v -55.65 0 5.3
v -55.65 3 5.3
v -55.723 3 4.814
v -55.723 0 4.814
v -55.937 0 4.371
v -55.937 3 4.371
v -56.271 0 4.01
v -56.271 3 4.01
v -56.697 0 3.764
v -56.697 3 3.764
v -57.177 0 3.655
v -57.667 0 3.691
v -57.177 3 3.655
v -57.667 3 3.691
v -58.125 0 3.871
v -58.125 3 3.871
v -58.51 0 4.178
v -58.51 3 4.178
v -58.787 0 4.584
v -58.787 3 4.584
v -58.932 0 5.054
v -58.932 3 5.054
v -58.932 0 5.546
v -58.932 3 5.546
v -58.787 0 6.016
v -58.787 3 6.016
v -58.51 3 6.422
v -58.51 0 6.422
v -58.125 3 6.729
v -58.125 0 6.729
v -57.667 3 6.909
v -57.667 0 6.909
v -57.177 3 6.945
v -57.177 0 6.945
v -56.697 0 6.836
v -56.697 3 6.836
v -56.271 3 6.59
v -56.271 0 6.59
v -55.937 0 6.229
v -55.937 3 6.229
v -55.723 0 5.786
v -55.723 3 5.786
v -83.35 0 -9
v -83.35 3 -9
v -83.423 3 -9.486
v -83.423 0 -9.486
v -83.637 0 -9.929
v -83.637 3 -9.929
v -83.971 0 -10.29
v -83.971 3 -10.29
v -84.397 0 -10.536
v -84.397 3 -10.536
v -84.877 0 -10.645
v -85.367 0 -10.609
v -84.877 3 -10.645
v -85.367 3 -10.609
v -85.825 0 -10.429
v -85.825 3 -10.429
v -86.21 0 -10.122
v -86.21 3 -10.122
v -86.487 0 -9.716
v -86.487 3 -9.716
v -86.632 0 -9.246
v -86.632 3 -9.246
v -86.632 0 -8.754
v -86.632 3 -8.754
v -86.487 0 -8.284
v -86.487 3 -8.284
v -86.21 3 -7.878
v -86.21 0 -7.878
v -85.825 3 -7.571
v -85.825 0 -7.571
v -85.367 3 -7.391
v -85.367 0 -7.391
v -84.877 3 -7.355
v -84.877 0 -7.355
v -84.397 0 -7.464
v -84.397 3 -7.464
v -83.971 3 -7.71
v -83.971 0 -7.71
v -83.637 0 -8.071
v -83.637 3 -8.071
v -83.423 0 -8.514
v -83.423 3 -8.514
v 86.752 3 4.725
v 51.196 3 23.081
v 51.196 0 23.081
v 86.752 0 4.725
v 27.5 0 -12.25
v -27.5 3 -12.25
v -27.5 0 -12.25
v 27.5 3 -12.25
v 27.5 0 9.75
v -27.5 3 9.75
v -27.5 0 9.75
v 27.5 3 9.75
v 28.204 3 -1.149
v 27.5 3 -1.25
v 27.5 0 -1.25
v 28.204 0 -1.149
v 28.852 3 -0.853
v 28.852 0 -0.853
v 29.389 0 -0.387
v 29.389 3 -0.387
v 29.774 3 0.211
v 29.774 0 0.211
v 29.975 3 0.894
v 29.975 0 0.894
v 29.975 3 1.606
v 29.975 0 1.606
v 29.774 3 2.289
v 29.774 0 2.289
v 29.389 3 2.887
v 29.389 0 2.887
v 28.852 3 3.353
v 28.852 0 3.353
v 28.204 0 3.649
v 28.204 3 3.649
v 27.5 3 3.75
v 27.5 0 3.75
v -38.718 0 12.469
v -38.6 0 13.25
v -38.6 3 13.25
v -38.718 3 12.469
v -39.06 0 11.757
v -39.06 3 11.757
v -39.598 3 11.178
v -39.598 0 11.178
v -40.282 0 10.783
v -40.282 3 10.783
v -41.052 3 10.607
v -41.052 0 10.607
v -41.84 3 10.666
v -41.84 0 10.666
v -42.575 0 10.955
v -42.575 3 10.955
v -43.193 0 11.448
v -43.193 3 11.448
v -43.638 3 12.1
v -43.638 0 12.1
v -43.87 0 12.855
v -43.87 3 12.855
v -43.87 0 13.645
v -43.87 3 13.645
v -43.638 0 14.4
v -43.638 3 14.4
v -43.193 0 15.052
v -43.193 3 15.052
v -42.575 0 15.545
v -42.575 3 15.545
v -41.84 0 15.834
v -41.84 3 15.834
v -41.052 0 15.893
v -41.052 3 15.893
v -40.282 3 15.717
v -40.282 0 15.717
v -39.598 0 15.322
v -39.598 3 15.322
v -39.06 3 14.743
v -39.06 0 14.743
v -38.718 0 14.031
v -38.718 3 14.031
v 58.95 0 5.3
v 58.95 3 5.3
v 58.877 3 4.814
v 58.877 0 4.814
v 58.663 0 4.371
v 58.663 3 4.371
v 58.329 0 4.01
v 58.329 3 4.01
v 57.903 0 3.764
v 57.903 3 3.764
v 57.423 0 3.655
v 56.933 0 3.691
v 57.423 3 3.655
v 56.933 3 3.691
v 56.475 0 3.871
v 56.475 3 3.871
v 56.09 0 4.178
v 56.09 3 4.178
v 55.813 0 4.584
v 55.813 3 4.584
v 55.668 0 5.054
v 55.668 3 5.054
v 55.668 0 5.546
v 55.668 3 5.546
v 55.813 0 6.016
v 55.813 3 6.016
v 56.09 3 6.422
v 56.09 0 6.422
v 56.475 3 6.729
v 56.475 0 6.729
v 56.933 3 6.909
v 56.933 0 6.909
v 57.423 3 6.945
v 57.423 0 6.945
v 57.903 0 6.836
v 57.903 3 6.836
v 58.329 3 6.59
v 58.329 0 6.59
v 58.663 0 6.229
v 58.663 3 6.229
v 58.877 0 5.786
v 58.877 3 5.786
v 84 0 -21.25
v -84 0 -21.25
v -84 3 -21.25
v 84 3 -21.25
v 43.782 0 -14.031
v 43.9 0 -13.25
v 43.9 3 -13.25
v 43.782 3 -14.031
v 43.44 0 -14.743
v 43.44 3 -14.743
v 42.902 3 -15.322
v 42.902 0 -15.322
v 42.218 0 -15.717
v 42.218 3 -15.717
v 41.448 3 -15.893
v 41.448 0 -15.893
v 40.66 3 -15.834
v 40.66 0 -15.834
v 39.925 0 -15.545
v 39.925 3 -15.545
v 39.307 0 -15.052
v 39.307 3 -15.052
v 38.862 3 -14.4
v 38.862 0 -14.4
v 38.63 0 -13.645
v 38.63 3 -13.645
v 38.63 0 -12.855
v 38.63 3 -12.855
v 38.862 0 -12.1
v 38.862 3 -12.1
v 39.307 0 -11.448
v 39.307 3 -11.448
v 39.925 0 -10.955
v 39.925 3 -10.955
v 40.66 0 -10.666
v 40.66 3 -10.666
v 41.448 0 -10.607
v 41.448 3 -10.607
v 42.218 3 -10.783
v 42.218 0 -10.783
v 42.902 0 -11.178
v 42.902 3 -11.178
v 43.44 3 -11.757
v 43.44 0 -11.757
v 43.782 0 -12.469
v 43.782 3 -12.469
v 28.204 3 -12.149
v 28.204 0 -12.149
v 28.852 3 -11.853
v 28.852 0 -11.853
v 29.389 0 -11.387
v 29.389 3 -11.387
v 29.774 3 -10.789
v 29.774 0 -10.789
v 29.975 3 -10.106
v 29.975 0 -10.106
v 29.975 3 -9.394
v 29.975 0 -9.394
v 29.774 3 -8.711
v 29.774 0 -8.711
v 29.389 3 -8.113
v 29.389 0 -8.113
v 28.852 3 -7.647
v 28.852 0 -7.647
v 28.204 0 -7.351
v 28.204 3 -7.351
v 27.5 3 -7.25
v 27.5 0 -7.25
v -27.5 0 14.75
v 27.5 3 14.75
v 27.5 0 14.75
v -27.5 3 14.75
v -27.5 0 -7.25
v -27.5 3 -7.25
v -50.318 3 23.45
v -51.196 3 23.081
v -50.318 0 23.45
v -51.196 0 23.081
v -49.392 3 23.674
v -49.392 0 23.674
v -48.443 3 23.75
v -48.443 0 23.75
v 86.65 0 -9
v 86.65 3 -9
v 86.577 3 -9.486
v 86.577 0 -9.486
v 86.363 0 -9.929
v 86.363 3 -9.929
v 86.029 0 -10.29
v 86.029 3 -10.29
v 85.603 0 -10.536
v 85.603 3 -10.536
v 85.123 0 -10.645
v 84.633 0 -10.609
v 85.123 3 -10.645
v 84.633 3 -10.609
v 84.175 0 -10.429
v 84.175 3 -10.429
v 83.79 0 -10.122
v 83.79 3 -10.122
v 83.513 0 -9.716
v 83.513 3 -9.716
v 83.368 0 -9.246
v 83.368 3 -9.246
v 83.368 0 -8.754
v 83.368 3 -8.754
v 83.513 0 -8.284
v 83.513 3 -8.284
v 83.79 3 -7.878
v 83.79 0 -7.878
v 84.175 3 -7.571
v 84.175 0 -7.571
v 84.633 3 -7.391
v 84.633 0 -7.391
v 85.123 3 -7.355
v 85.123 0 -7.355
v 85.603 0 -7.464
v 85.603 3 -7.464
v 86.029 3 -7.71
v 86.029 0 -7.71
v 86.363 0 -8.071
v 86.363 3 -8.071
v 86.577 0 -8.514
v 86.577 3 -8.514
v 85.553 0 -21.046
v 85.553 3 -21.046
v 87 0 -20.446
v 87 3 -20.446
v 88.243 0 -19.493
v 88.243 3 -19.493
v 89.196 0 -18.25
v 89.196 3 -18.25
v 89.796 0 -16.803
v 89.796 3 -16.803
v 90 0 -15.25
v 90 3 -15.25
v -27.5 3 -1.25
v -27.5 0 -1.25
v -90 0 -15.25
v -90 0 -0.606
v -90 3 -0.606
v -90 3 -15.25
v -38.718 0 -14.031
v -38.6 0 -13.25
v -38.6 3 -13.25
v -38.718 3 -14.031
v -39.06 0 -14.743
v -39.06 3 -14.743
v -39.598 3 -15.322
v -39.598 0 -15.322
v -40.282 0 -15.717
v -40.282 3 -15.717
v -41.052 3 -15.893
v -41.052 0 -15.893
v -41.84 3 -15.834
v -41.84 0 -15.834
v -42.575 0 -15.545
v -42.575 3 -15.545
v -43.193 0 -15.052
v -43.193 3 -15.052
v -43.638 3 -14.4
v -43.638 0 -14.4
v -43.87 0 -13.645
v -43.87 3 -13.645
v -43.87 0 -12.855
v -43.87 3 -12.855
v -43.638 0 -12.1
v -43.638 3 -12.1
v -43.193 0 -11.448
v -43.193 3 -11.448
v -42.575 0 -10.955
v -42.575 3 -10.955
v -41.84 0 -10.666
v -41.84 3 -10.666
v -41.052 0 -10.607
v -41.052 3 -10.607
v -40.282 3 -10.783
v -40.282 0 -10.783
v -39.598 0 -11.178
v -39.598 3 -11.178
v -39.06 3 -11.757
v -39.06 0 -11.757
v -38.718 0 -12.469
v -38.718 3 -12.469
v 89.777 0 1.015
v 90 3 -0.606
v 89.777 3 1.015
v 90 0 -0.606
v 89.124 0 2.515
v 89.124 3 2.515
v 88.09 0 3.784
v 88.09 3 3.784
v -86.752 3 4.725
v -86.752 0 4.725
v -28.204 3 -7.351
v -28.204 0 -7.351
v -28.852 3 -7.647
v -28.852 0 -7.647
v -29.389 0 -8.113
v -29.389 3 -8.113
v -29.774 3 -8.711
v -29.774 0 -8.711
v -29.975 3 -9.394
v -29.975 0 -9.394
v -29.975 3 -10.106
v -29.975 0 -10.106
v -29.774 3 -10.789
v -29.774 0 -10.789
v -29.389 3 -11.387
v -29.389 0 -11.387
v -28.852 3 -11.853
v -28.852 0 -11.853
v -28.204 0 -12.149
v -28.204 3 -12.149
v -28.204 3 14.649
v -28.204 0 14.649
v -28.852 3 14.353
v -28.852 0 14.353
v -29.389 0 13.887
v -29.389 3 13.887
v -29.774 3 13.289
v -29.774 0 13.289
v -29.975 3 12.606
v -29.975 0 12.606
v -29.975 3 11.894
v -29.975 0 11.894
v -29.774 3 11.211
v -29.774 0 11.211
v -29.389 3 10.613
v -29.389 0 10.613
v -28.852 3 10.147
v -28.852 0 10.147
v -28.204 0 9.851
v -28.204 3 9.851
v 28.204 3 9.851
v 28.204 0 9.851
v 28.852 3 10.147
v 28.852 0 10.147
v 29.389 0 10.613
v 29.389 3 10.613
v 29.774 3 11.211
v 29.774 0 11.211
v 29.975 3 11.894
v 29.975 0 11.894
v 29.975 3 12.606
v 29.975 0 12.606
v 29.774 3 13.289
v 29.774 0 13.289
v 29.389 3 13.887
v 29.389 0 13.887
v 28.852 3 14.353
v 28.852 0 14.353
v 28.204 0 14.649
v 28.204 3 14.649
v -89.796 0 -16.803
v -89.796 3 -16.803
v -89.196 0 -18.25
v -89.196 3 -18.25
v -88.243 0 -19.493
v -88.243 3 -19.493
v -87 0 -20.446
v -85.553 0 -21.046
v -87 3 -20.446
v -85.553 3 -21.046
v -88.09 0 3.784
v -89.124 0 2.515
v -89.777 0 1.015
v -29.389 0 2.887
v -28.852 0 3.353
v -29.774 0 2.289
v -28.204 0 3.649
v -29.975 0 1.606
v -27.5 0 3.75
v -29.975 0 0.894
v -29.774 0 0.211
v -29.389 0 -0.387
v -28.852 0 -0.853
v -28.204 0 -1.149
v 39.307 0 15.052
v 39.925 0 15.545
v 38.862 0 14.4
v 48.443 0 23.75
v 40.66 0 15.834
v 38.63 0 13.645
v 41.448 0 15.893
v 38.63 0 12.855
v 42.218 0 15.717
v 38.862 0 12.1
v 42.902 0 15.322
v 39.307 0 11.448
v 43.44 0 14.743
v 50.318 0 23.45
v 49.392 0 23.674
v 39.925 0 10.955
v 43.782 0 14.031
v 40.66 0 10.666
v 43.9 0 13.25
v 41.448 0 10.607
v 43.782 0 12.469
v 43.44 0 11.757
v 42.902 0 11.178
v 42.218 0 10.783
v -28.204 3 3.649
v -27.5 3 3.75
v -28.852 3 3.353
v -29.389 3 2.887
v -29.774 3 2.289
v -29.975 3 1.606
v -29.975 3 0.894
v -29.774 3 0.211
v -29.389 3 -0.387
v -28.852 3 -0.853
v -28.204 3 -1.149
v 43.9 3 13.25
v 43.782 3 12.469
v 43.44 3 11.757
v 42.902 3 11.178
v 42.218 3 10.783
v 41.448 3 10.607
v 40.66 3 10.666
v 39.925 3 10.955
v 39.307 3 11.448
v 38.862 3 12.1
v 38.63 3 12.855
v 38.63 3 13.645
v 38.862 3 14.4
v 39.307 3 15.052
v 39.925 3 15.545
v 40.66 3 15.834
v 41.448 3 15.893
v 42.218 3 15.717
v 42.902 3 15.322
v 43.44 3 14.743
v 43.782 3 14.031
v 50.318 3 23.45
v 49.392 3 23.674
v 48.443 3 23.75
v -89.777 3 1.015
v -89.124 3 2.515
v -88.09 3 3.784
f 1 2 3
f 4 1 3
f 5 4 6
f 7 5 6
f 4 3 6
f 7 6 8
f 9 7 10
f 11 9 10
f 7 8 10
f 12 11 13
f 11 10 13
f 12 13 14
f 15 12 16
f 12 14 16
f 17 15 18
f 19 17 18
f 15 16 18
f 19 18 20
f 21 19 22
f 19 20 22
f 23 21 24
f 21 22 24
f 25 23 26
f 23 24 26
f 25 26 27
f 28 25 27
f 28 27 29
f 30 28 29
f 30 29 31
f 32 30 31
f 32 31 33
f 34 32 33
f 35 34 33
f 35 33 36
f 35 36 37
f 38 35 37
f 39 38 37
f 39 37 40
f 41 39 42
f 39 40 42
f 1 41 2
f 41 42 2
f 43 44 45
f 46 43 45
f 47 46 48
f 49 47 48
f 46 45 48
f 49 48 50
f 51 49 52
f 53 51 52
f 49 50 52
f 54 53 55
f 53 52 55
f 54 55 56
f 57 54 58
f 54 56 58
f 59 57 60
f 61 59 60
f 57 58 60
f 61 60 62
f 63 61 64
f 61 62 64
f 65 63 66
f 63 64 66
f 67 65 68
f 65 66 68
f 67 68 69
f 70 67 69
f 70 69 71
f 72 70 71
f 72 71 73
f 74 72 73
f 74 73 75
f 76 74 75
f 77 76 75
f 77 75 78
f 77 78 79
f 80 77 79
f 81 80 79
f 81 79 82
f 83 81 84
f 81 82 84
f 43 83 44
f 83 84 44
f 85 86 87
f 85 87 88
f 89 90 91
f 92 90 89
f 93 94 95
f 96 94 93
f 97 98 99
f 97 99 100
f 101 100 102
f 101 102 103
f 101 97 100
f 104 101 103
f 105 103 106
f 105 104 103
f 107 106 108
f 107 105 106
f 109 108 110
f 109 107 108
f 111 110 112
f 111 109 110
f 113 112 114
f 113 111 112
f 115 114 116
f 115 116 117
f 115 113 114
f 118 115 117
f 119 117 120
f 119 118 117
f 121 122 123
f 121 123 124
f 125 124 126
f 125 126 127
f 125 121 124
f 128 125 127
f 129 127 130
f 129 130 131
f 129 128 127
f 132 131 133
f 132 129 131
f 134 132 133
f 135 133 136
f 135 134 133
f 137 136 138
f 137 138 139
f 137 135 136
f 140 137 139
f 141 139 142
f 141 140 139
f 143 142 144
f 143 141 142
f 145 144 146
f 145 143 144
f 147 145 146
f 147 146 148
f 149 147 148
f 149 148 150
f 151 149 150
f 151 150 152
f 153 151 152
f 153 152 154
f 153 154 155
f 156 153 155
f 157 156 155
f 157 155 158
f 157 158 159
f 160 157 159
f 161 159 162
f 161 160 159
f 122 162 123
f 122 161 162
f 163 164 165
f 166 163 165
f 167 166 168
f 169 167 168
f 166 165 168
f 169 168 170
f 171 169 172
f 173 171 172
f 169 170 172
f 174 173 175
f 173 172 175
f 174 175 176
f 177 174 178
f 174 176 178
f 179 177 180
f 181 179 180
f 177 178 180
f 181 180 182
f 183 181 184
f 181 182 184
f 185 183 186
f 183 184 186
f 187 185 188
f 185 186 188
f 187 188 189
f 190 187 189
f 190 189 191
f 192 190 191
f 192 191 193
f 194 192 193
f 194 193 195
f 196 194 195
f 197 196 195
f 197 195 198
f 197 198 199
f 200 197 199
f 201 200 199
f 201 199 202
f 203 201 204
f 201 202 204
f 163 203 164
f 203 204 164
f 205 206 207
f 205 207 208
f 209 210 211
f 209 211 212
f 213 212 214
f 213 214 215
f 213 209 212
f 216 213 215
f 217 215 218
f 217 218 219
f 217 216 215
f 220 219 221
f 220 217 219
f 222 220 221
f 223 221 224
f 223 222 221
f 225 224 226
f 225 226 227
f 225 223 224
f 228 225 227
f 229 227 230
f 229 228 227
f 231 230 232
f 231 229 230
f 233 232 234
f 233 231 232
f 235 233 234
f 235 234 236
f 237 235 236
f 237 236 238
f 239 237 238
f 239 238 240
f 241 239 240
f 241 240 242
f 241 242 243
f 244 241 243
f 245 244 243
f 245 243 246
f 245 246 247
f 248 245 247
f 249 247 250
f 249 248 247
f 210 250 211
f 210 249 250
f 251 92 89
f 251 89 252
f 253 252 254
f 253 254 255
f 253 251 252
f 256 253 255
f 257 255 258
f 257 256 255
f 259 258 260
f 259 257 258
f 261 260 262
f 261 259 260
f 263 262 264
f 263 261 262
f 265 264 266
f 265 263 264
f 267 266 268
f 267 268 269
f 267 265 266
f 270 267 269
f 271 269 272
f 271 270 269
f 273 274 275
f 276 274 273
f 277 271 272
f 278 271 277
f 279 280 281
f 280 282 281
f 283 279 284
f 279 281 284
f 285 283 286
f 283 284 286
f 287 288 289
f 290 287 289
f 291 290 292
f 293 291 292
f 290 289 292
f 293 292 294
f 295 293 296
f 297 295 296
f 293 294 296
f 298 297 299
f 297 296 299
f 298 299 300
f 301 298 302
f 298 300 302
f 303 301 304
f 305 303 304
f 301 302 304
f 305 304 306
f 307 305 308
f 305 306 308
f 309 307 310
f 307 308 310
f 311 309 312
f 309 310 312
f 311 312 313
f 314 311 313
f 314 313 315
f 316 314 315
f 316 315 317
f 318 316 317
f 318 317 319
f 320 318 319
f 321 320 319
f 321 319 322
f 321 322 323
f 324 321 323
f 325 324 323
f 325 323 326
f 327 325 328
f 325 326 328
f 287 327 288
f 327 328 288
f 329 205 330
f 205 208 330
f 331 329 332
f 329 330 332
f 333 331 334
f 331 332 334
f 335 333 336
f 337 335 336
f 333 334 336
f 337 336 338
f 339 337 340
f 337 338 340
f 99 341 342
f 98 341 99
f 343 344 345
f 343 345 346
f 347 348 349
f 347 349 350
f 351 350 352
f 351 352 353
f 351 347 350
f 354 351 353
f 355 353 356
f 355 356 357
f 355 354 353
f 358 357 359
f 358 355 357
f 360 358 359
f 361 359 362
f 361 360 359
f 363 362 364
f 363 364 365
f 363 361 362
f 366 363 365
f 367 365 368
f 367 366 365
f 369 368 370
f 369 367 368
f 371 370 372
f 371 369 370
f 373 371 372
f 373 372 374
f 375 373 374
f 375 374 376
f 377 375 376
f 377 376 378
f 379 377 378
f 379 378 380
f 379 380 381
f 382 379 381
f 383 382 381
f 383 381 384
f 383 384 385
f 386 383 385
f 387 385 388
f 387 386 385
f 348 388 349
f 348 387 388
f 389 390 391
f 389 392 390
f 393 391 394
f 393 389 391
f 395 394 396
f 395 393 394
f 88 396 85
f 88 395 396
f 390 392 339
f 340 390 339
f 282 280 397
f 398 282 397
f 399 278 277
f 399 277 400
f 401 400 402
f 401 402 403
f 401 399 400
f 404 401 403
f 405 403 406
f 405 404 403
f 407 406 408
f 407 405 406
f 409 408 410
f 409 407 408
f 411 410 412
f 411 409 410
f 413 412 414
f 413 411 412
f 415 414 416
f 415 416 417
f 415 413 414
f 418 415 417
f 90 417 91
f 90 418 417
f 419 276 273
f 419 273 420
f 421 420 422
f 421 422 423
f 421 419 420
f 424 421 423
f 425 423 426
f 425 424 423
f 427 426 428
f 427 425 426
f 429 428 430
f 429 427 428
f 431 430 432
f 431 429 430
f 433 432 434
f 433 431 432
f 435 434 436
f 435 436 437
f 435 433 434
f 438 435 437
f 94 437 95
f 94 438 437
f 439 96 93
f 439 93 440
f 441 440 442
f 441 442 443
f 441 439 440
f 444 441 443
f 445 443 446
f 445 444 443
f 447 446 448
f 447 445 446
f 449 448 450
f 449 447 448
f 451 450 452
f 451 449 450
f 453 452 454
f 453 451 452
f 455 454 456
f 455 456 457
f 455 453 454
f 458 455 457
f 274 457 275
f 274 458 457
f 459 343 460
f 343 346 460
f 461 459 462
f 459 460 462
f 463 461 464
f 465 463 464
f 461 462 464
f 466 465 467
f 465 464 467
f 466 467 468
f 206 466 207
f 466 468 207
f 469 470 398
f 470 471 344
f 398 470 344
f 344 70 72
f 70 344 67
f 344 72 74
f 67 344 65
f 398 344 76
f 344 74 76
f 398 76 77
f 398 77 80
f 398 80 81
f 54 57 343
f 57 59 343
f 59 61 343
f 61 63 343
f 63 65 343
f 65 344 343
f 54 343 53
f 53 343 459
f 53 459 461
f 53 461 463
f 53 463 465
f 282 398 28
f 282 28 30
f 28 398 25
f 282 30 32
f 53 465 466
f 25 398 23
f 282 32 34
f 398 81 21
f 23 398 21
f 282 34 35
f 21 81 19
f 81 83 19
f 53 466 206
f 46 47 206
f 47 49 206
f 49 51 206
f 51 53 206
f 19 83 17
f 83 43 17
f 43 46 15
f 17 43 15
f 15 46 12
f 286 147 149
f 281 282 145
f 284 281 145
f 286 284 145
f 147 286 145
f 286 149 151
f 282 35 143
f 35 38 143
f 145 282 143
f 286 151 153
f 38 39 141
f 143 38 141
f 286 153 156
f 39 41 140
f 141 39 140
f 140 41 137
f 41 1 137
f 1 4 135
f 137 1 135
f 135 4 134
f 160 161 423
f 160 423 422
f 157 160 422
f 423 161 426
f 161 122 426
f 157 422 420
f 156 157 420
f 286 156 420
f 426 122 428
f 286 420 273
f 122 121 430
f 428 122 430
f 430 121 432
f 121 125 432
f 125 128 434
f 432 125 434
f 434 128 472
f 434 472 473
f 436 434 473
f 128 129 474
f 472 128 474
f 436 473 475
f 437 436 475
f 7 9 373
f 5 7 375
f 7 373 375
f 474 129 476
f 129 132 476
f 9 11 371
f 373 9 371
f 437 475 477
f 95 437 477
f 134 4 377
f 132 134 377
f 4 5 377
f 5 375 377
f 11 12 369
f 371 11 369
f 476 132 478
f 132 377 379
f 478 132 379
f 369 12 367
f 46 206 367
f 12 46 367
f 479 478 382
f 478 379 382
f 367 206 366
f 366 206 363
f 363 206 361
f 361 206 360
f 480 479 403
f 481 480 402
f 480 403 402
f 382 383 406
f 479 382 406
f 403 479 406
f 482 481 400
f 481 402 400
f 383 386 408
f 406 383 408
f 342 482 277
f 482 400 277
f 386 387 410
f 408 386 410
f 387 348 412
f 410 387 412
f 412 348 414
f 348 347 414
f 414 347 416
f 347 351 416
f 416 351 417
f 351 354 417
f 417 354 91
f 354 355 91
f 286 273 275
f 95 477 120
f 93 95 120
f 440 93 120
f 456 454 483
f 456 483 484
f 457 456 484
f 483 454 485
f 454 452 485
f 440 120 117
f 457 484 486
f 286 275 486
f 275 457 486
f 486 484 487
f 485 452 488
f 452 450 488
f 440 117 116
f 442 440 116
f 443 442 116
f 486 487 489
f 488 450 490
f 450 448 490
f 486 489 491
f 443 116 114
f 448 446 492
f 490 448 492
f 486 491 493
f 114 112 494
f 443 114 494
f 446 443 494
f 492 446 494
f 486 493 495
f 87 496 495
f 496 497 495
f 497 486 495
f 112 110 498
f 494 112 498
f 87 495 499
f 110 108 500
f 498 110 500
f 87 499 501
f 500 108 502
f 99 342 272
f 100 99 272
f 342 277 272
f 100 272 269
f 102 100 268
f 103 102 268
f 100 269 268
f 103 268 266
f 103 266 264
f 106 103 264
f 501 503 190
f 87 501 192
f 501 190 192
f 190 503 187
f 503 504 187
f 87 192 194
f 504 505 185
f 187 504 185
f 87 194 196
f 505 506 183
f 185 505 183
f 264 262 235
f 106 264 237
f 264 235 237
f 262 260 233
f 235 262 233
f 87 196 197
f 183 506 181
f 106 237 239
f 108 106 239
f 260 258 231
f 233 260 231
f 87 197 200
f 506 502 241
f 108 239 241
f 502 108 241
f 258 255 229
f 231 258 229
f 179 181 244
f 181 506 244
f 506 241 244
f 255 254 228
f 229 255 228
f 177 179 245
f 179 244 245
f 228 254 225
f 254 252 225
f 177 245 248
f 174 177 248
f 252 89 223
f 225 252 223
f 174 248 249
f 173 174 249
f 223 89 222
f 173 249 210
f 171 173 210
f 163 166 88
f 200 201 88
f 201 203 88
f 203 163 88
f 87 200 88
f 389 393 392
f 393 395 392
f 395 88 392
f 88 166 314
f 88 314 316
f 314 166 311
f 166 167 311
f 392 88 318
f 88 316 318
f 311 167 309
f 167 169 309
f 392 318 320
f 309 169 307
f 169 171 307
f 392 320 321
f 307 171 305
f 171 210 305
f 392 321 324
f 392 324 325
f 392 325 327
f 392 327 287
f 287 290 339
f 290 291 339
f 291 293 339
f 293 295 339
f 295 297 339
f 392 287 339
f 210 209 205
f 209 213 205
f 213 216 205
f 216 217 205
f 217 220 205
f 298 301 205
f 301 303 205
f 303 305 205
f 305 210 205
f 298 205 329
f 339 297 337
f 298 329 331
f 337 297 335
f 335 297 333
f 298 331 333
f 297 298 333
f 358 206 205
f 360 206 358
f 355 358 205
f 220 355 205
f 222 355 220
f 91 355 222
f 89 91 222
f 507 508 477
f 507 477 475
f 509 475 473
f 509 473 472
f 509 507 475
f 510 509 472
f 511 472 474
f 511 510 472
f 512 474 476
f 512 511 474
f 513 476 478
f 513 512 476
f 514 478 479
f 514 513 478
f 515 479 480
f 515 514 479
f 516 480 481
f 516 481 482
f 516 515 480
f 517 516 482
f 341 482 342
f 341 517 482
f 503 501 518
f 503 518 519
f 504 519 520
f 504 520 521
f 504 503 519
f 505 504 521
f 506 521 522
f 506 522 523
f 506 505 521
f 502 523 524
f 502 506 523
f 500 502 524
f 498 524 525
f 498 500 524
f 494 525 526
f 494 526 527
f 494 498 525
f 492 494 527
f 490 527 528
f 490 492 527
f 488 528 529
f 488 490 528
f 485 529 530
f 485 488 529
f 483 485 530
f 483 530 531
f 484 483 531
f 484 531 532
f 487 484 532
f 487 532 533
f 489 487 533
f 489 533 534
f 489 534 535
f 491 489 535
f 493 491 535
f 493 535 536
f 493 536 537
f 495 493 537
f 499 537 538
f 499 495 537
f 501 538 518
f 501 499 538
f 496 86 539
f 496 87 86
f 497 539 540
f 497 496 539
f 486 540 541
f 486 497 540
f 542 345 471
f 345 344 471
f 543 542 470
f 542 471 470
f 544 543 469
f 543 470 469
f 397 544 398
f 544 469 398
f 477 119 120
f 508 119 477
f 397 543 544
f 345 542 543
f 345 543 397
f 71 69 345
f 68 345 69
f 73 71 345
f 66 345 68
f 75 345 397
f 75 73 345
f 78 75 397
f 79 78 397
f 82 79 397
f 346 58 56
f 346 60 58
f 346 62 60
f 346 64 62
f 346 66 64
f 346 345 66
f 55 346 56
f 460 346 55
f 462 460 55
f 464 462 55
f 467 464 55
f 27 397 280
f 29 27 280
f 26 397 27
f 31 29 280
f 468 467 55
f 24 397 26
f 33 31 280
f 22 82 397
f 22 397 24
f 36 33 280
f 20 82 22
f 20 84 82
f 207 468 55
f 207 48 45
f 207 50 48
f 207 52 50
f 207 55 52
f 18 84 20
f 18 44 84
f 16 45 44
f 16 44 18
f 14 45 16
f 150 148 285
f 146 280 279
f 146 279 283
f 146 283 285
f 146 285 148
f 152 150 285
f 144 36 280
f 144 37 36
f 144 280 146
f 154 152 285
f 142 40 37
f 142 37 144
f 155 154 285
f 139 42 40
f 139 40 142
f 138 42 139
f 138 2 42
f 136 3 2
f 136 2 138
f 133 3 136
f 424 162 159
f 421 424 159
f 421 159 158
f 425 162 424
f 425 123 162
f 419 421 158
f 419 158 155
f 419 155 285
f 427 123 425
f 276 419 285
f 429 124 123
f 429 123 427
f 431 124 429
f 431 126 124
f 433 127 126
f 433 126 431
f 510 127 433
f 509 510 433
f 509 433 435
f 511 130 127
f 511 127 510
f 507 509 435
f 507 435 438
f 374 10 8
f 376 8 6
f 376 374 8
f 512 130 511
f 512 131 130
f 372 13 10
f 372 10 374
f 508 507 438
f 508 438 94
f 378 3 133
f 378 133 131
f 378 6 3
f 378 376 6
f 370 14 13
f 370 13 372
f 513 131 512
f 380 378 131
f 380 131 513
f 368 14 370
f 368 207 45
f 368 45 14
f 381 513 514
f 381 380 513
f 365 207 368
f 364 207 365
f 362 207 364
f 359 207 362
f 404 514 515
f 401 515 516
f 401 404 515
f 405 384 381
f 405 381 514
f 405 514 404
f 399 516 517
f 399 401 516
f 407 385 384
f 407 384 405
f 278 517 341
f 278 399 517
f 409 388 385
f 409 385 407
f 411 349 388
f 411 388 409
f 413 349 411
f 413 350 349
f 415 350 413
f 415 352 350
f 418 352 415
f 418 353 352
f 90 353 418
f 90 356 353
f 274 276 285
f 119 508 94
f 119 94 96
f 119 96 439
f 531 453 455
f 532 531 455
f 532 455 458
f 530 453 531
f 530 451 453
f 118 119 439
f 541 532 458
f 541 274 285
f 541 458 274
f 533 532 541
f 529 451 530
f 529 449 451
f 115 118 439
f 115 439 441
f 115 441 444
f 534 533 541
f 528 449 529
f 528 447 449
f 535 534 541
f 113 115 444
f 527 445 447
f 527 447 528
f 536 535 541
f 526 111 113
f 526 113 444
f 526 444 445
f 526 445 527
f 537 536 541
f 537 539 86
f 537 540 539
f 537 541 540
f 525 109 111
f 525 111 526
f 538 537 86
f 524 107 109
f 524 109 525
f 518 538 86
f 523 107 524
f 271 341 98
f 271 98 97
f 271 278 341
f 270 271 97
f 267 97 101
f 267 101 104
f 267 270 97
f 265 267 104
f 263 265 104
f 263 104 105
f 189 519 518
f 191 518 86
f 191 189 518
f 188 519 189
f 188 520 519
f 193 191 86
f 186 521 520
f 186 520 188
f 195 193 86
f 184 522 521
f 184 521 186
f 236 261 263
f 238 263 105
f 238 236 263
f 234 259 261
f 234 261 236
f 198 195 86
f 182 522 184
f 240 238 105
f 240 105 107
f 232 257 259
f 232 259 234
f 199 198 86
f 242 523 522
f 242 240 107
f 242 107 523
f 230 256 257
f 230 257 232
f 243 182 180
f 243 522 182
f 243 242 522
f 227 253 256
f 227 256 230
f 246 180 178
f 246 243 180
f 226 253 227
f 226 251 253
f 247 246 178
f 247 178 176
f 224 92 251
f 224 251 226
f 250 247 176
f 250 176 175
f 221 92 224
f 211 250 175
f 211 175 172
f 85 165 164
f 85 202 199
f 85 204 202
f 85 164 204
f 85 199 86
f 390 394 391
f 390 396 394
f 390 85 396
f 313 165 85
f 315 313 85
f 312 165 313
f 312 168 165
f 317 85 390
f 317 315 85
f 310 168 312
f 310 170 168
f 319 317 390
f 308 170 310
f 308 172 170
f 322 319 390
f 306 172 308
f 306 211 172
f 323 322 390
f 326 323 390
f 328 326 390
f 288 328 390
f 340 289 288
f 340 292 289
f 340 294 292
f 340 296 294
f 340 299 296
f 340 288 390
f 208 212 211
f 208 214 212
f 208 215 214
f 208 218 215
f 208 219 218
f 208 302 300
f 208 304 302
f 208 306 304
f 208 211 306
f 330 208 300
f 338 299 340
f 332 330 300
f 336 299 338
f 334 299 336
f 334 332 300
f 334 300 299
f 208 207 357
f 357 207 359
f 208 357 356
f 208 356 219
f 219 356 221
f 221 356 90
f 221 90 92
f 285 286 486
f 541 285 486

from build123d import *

# Parameters (mm, degrees)
SKETCH_1_W          = 180
SKETCH_1_H          = 45
SKETCH_1_R          = 2.65
EXTRUDE_1_DEPTH     = 3
SKETCH_2_R          = 1.65
CUT_EXTRUDE_1_DEPTH = 3
CUT_EXTRUDE_2_DEPTH = 3
FILLET_1_R          = 6
CUT_EXTRUDE_3_DEPTH = 3


with BuildPart() as part:
    # 草图1 → 凸台-拉伸1 (new body)
    with BuildSketch(Plane(origin=(0, 0, 0), x_dir=(1, 0, 0), z_dir=(0, 1, 0))):
        with Locations((0, -1.25)):
            Rectangle(SKETCH_1_W, SKETCH_1_H)
        with Locations((-41.25, 13.25)):
            Circle(SKETCH_1_R, mode=Mode.SUBTRACT)
        with Locations((41.25, 13.25)):
            Circle(SKETCH_1_R, mode=Mode.SUBTRACT)
        with Locations((-41.25, -13.25)):
            Circle(SKETCH_1_R, mode=Mode.SUBTRACT)
        with Locations((41.25, -13.25)):
            Circle(SKETCH_1_R, mode=Mode.SUBTRACT)
    extrude(amount=EXTRUDE_1_DEPTH)

    # 草图2 → 切除-拉伸1 (cut)
    with BuildSketch(Plane(origin=(0, 3, 0), x_dir=(1, 0, 0), z_dir=(0, 1, 0))):
        with Locations((-85, 9)):
            Circle(SKETCH_2_R)
        with Locations((85, 9)):
            Circle(SKETCH_2_R)
        with Locations((-57.3, -5.3)):
            Circle(SKETCH_2_R)
        with Locations((57.3, -5.3)):
            Circle(SKETCH_2_R)
    extrude(amount=-CUT_EXTRUDE_1_DEPTH, mode=Mode.SUBTRACT)

    # 草图3 → 切除-拉伸2 (cut)
    with BuildSketch(Plane(origin=(0, 3, 0), x_dir=(1, 0, 0), z_dir=(0, 1, 0))):
        Polygon((-90, -3.048881556), (-90, -23.75), (-49.900630707, -23.75), align=None)
        Polygon((90, -23.75), (49.900630707, -23.75), (90, -3.048881556), align=None)
    extrude(amount=-CUT_EXTRUDE_2_DEPTH, mode=Mode.SUBTRACT)

    # 圆角1
    fillet_1_edges = [part.edges().sort_by_distance(p)[0] for p in [
        (-90, 1.5, 3.048881556),
        (-49.900630707, 1.5, 23.75),
        (90, 1.5, 3.048881556),
        (49.900630707, 1.5, 23.75),
        (-90, 1.5, -21.25),
        (90, 1.5, -21.25),
    ]]
    fillet(fillet_1_edges, radius=FILLET_1_R)

    # 草图4 → 切除-拉伸3 (cut)
    with BuildSketch(Plane(origin=(0, 3, 0), x_dir=(1, 0, 0), z_dir=(0, 1, 0))):
        with BuildLine():
            Line((-27.5, 12.25), (27.5, 12.25))
            ThreePointArc((27.5, 12.25), (30, 9.75), (27.5, 7.25))
            Line((27.5, 7.25), (-27.5, 7.25))
            ThreePointArc((-27.5, 7.25), (-30, 9.75), (-27.5, 12.25))
        make_face()
        with BuildLine():
            Line((-27.5, 1.25), (27.5, 1.25))
            ThreePointArc((27.5, 1.25), (30, -1.25), (27.5, -3.75))
            Line((27.5, -3.75), (-27.5, -3.75))
            ThreePointArc((-27.5, -3.75), (-30, -1.25), (-27.5, 1.25))
        make_face()
        with BuildLine():
            Line((-27.5, -9.75), (27.5, -9.75))
            ThreePointArc((27.5, -9.75), (30, -12.25), (27.5, -14.75))
            Line((27.5, -14.75), (-27.5, -14.75))
            ThreePointArc((-27.5, -14.75), (-30, -12.25), (-27.5, -9.75))
        make_face()
    extrude(amount=-CUT_EXTRUDE_3_DEPTH, mode=Mode.SUBTRACT)


solid = part.part
